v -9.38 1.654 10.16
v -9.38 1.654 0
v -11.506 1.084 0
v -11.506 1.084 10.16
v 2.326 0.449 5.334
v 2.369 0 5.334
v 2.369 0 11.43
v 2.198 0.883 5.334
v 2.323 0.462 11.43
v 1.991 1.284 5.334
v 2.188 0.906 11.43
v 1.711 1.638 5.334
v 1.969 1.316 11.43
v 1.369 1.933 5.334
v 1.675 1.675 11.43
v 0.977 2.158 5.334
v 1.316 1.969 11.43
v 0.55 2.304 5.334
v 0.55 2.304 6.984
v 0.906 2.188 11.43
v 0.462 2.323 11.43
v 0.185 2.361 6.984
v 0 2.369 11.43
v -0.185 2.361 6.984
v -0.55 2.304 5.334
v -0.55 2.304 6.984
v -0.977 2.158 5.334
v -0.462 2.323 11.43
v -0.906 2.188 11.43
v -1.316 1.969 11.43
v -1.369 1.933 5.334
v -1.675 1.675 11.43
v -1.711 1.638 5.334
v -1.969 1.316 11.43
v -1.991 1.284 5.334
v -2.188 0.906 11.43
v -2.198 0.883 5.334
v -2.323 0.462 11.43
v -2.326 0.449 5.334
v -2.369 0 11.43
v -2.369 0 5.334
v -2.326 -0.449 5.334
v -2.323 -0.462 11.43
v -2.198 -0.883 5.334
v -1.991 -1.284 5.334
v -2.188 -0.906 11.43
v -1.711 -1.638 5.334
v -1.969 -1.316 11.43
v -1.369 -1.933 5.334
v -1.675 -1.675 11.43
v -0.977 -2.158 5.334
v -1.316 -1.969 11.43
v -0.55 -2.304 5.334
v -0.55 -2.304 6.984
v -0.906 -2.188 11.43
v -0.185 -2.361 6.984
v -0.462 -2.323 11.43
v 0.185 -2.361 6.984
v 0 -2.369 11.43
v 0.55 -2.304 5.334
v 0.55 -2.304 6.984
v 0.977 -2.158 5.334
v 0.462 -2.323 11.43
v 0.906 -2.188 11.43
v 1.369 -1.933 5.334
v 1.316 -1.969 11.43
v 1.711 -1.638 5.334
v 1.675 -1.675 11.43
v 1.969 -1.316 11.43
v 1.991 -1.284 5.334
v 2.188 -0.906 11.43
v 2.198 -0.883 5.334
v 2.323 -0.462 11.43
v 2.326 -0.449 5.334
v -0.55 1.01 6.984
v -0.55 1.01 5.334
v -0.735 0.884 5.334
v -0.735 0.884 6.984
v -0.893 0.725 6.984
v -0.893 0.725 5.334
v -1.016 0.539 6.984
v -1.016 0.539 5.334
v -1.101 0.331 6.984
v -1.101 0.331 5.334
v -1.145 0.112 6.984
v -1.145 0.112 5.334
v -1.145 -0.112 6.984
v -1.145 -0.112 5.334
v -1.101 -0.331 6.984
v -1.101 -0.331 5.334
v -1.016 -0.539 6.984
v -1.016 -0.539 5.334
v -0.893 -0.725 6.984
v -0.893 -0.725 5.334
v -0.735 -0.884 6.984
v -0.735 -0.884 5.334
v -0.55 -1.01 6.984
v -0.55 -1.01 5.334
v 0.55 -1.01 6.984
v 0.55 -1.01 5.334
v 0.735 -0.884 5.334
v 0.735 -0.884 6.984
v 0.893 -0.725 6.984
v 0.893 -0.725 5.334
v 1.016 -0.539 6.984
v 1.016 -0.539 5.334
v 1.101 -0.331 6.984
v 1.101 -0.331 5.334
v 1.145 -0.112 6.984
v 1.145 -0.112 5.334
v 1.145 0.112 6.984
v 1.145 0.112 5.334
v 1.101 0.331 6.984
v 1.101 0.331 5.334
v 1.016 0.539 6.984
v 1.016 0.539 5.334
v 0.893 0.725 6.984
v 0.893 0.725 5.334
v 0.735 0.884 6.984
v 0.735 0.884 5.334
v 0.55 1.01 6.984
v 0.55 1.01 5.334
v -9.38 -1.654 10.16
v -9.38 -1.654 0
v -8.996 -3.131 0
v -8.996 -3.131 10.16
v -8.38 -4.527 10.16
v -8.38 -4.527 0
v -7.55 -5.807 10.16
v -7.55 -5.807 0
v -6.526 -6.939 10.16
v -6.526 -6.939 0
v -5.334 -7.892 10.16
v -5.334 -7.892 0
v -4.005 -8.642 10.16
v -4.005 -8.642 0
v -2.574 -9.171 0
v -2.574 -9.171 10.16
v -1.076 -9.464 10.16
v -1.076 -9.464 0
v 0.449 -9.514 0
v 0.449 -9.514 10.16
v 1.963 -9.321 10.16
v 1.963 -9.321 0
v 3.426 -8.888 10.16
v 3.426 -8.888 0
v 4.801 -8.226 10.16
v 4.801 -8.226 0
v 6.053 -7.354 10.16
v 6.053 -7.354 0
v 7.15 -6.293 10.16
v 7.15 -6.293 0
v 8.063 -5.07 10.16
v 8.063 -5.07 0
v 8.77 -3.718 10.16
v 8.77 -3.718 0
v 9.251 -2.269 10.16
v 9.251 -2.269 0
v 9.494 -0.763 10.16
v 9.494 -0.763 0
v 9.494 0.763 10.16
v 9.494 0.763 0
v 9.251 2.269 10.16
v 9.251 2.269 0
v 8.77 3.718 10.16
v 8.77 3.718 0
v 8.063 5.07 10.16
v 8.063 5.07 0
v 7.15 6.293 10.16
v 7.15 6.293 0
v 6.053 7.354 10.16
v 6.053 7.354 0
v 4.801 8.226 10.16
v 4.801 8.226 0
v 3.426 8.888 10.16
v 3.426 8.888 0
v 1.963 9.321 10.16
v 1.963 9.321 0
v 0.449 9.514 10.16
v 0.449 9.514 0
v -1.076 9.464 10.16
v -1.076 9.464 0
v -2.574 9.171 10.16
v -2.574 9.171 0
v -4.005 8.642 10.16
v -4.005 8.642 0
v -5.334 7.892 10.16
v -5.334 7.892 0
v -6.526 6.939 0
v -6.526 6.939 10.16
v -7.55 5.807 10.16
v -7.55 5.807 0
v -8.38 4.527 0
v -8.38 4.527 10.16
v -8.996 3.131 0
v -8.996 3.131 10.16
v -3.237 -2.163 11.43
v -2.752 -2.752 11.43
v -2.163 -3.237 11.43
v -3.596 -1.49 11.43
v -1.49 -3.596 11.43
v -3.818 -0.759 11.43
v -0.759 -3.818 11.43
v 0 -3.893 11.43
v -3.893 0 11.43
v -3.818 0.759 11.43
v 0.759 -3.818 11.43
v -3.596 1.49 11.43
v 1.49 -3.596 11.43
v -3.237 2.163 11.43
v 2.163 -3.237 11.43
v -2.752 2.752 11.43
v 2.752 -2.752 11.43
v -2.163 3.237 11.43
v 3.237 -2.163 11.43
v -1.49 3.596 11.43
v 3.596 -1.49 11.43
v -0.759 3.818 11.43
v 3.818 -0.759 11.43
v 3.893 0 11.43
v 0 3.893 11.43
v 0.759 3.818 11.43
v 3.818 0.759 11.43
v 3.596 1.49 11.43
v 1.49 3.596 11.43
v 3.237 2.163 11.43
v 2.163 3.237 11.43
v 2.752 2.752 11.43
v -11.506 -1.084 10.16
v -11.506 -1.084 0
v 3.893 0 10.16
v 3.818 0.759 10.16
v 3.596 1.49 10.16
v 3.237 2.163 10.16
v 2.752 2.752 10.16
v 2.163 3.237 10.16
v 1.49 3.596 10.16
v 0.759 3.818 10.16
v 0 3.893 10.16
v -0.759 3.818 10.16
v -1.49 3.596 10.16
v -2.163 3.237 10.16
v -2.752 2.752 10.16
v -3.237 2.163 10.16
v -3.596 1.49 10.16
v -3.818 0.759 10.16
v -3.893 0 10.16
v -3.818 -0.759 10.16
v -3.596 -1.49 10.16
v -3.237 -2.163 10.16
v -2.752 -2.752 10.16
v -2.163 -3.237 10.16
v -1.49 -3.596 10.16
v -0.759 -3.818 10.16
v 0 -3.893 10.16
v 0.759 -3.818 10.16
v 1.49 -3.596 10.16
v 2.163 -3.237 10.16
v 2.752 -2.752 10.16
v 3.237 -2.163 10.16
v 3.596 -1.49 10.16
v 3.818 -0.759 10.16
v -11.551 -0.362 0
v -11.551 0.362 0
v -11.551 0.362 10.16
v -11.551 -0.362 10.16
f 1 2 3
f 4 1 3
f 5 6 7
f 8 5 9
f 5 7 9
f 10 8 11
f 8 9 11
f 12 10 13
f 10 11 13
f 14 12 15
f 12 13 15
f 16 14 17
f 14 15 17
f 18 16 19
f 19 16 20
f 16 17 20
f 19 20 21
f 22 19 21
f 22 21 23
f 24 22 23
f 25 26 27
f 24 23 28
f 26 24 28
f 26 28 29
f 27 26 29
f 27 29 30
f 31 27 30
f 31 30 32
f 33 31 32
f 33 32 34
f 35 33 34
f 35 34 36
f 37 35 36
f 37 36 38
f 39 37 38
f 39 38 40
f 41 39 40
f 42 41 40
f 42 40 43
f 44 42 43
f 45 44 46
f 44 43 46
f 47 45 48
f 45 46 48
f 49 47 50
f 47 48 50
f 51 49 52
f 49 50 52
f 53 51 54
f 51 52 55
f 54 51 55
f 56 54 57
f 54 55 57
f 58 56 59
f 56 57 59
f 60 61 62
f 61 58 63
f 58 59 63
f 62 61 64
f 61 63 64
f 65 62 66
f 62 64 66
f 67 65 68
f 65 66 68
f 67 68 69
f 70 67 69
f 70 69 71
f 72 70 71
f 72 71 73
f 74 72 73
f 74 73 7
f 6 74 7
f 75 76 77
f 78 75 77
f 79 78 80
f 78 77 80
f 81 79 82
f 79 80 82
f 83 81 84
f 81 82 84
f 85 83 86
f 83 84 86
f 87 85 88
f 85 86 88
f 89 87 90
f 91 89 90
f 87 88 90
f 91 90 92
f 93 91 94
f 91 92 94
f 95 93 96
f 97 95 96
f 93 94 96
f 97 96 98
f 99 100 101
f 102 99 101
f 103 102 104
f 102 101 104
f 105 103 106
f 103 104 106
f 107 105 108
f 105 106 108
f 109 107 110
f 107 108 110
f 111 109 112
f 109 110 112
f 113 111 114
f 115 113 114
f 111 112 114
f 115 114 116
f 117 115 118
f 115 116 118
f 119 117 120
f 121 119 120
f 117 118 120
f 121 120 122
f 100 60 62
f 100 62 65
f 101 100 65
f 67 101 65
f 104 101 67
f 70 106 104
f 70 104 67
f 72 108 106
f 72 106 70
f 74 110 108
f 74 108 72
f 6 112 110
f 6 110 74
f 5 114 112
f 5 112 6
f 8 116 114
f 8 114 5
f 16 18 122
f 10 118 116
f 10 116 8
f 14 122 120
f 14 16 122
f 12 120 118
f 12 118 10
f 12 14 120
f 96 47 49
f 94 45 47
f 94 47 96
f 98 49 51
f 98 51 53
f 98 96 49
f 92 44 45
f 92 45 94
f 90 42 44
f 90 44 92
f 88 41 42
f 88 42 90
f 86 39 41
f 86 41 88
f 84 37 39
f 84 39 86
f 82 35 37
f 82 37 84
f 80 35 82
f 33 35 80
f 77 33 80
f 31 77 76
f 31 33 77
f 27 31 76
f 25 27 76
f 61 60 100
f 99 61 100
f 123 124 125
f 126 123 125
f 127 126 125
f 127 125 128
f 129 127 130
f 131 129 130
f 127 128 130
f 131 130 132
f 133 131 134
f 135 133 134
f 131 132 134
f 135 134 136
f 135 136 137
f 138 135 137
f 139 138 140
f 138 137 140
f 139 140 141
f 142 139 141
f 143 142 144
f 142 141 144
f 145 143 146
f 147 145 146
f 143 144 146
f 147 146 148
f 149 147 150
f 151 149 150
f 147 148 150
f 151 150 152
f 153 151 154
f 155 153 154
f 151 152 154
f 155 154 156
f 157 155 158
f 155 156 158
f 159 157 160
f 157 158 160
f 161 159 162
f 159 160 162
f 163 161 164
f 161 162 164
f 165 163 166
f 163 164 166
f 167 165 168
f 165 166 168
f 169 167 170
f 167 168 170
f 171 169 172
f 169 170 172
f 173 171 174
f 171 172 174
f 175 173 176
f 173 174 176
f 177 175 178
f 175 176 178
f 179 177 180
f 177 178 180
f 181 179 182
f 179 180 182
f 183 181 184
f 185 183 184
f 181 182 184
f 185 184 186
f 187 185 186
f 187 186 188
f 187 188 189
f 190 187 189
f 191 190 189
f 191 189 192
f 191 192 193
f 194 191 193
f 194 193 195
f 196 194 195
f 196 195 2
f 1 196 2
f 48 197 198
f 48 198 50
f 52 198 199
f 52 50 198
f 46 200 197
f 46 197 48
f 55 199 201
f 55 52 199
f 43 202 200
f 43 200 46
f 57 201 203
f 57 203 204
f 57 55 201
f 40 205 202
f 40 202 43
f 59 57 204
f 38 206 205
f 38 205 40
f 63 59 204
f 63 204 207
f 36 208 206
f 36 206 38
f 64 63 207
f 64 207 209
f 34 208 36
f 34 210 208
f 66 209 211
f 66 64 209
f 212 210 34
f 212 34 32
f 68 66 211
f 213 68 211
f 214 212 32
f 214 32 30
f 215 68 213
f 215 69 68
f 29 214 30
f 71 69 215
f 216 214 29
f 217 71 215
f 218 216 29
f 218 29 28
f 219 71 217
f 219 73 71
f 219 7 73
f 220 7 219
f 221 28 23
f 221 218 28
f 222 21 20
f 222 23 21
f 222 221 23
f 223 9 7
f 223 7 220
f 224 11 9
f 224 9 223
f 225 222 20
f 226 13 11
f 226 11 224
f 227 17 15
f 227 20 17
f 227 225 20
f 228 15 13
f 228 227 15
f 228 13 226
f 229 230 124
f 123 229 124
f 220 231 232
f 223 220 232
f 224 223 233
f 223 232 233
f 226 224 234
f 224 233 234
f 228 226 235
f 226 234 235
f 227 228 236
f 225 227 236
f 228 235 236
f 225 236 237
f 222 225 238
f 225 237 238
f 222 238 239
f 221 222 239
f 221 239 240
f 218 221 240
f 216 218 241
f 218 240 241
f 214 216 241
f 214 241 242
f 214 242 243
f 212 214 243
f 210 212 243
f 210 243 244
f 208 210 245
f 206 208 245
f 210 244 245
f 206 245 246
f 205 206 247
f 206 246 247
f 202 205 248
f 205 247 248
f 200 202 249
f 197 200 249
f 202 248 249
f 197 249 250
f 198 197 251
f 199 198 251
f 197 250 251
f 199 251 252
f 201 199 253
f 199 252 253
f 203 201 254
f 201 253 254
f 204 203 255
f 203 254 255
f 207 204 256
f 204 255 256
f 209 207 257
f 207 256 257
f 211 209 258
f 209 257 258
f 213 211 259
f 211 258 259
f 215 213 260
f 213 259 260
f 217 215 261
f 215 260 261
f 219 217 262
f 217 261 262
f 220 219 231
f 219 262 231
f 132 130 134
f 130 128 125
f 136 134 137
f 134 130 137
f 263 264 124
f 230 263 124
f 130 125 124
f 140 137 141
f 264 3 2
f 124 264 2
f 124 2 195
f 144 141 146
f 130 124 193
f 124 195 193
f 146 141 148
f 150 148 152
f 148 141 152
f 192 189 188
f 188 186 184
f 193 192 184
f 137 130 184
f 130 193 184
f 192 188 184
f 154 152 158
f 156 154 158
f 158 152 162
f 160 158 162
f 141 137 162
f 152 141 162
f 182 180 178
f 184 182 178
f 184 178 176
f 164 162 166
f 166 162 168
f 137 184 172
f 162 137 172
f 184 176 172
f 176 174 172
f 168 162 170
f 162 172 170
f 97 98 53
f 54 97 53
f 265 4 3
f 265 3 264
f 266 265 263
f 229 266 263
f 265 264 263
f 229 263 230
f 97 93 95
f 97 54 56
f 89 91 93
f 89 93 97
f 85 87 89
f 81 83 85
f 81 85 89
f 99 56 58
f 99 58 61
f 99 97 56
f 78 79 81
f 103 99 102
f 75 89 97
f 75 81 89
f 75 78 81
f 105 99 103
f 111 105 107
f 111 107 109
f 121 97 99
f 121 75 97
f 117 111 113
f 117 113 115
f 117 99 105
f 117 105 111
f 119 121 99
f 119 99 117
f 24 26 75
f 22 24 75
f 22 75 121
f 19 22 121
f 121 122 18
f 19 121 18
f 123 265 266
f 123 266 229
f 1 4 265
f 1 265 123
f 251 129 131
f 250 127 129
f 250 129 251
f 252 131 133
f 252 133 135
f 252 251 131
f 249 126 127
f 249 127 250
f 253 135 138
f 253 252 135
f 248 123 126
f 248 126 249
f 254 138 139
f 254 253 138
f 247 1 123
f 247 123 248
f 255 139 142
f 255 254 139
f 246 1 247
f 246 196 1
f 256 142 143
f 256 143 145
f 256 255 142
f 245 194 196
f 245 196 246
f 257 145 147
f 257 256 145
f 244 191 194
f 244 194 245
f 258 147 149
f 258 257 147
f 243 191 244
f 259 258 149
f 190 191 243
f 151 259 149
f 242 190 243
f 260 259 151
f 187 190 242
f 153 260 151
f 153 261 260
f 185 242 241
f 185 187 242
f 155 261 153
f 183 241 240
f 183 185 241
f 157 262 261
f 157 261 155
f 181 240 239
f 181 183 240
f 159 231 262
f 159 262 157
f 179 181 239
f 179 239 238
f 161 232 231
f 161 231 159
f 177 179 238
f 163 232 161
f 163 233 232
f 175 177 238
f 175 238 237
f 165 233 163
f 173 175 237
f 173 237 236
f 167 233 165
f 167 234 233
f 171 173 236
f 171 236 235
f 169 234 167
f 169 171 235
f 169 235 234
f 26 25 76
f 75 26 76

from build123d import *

# Parameters (mm, degrees)
F2_DEPTH = 10.16
F3_R     = 3.89255
F4_DEPTH = 1.27
F5_R     = 2.36855
F6_DEPTH = 6.096
F8_DEPTH = 1.65


with BuildPart() as f2:
    # F1 (on Top) → F2 (new body)
    with BuildSketch(Plane.XY):
        with BuildLine():
            Line((-11.5060112064, -1.0844146426), (-9.3802938474, -1.6539988923))
            ThreePointArc((-9.3802938474, -1.6539988923), (9.525, 0), (-9.3802938474, 1.6539988923))
            Line((-9.3802938474, 1.6539988923), (-11.5060112064, 1.0844146426))
            ThreePointArc((-11.5060112064, 1.0844146426), (-11.557, 0), (-11.5060112064, -1.0844146426))
        make_face()
    extrude(amount=F2_DEPTH)

    # F3 (on face) → F4 (join)
    with BuildSketch(Plane.XY.offset(10.16)):
        Circle(F3_R)
    extrude(amount=F4_DEPTH)

    # F5 (on face) → F6 (cut)
    with BuildSketch(Plane.XY.offset(11.43)):
        Circle(F5_R)
    extrude(amount=-F6_DEPTH, mode=Mode.SUBTRACT)

    # F7 (on face) → F8 (join)
    with BuildSketch(Plane.XY.offset(5.334)):
        with BuildLine():
            ThreePointArc((0.55, 2.3038075229), (0, 2.36855), (-0.55, 2.3038075229))
            Line((-0.55, 2.3038075229), (-0.55, 1.0099504938))
            ThreePointArc((-0.55, 1.0099504938), (-1.15, 0), (-0.55, -1.0099504938))
            Line((-0.55, -1.0099504938), (-0.55, -2.3038075229))
            ThreePointArc((-0.55, -2.3038075229), (0, -2.36855), (0.55, -2.3038075229))
            Line((0.55, -2.3038075229), (0.55, -1.0099504938))
            ThreePointArc((0.55, -1.0099504938), (1.15, 0), (0.55, 1.0099504938))
            Line((0.55, 1.0099504938), (0.55, 2.3038075229))
        make_face()
    extrude(amount=F8_DEPTH)


solid = f2.part
